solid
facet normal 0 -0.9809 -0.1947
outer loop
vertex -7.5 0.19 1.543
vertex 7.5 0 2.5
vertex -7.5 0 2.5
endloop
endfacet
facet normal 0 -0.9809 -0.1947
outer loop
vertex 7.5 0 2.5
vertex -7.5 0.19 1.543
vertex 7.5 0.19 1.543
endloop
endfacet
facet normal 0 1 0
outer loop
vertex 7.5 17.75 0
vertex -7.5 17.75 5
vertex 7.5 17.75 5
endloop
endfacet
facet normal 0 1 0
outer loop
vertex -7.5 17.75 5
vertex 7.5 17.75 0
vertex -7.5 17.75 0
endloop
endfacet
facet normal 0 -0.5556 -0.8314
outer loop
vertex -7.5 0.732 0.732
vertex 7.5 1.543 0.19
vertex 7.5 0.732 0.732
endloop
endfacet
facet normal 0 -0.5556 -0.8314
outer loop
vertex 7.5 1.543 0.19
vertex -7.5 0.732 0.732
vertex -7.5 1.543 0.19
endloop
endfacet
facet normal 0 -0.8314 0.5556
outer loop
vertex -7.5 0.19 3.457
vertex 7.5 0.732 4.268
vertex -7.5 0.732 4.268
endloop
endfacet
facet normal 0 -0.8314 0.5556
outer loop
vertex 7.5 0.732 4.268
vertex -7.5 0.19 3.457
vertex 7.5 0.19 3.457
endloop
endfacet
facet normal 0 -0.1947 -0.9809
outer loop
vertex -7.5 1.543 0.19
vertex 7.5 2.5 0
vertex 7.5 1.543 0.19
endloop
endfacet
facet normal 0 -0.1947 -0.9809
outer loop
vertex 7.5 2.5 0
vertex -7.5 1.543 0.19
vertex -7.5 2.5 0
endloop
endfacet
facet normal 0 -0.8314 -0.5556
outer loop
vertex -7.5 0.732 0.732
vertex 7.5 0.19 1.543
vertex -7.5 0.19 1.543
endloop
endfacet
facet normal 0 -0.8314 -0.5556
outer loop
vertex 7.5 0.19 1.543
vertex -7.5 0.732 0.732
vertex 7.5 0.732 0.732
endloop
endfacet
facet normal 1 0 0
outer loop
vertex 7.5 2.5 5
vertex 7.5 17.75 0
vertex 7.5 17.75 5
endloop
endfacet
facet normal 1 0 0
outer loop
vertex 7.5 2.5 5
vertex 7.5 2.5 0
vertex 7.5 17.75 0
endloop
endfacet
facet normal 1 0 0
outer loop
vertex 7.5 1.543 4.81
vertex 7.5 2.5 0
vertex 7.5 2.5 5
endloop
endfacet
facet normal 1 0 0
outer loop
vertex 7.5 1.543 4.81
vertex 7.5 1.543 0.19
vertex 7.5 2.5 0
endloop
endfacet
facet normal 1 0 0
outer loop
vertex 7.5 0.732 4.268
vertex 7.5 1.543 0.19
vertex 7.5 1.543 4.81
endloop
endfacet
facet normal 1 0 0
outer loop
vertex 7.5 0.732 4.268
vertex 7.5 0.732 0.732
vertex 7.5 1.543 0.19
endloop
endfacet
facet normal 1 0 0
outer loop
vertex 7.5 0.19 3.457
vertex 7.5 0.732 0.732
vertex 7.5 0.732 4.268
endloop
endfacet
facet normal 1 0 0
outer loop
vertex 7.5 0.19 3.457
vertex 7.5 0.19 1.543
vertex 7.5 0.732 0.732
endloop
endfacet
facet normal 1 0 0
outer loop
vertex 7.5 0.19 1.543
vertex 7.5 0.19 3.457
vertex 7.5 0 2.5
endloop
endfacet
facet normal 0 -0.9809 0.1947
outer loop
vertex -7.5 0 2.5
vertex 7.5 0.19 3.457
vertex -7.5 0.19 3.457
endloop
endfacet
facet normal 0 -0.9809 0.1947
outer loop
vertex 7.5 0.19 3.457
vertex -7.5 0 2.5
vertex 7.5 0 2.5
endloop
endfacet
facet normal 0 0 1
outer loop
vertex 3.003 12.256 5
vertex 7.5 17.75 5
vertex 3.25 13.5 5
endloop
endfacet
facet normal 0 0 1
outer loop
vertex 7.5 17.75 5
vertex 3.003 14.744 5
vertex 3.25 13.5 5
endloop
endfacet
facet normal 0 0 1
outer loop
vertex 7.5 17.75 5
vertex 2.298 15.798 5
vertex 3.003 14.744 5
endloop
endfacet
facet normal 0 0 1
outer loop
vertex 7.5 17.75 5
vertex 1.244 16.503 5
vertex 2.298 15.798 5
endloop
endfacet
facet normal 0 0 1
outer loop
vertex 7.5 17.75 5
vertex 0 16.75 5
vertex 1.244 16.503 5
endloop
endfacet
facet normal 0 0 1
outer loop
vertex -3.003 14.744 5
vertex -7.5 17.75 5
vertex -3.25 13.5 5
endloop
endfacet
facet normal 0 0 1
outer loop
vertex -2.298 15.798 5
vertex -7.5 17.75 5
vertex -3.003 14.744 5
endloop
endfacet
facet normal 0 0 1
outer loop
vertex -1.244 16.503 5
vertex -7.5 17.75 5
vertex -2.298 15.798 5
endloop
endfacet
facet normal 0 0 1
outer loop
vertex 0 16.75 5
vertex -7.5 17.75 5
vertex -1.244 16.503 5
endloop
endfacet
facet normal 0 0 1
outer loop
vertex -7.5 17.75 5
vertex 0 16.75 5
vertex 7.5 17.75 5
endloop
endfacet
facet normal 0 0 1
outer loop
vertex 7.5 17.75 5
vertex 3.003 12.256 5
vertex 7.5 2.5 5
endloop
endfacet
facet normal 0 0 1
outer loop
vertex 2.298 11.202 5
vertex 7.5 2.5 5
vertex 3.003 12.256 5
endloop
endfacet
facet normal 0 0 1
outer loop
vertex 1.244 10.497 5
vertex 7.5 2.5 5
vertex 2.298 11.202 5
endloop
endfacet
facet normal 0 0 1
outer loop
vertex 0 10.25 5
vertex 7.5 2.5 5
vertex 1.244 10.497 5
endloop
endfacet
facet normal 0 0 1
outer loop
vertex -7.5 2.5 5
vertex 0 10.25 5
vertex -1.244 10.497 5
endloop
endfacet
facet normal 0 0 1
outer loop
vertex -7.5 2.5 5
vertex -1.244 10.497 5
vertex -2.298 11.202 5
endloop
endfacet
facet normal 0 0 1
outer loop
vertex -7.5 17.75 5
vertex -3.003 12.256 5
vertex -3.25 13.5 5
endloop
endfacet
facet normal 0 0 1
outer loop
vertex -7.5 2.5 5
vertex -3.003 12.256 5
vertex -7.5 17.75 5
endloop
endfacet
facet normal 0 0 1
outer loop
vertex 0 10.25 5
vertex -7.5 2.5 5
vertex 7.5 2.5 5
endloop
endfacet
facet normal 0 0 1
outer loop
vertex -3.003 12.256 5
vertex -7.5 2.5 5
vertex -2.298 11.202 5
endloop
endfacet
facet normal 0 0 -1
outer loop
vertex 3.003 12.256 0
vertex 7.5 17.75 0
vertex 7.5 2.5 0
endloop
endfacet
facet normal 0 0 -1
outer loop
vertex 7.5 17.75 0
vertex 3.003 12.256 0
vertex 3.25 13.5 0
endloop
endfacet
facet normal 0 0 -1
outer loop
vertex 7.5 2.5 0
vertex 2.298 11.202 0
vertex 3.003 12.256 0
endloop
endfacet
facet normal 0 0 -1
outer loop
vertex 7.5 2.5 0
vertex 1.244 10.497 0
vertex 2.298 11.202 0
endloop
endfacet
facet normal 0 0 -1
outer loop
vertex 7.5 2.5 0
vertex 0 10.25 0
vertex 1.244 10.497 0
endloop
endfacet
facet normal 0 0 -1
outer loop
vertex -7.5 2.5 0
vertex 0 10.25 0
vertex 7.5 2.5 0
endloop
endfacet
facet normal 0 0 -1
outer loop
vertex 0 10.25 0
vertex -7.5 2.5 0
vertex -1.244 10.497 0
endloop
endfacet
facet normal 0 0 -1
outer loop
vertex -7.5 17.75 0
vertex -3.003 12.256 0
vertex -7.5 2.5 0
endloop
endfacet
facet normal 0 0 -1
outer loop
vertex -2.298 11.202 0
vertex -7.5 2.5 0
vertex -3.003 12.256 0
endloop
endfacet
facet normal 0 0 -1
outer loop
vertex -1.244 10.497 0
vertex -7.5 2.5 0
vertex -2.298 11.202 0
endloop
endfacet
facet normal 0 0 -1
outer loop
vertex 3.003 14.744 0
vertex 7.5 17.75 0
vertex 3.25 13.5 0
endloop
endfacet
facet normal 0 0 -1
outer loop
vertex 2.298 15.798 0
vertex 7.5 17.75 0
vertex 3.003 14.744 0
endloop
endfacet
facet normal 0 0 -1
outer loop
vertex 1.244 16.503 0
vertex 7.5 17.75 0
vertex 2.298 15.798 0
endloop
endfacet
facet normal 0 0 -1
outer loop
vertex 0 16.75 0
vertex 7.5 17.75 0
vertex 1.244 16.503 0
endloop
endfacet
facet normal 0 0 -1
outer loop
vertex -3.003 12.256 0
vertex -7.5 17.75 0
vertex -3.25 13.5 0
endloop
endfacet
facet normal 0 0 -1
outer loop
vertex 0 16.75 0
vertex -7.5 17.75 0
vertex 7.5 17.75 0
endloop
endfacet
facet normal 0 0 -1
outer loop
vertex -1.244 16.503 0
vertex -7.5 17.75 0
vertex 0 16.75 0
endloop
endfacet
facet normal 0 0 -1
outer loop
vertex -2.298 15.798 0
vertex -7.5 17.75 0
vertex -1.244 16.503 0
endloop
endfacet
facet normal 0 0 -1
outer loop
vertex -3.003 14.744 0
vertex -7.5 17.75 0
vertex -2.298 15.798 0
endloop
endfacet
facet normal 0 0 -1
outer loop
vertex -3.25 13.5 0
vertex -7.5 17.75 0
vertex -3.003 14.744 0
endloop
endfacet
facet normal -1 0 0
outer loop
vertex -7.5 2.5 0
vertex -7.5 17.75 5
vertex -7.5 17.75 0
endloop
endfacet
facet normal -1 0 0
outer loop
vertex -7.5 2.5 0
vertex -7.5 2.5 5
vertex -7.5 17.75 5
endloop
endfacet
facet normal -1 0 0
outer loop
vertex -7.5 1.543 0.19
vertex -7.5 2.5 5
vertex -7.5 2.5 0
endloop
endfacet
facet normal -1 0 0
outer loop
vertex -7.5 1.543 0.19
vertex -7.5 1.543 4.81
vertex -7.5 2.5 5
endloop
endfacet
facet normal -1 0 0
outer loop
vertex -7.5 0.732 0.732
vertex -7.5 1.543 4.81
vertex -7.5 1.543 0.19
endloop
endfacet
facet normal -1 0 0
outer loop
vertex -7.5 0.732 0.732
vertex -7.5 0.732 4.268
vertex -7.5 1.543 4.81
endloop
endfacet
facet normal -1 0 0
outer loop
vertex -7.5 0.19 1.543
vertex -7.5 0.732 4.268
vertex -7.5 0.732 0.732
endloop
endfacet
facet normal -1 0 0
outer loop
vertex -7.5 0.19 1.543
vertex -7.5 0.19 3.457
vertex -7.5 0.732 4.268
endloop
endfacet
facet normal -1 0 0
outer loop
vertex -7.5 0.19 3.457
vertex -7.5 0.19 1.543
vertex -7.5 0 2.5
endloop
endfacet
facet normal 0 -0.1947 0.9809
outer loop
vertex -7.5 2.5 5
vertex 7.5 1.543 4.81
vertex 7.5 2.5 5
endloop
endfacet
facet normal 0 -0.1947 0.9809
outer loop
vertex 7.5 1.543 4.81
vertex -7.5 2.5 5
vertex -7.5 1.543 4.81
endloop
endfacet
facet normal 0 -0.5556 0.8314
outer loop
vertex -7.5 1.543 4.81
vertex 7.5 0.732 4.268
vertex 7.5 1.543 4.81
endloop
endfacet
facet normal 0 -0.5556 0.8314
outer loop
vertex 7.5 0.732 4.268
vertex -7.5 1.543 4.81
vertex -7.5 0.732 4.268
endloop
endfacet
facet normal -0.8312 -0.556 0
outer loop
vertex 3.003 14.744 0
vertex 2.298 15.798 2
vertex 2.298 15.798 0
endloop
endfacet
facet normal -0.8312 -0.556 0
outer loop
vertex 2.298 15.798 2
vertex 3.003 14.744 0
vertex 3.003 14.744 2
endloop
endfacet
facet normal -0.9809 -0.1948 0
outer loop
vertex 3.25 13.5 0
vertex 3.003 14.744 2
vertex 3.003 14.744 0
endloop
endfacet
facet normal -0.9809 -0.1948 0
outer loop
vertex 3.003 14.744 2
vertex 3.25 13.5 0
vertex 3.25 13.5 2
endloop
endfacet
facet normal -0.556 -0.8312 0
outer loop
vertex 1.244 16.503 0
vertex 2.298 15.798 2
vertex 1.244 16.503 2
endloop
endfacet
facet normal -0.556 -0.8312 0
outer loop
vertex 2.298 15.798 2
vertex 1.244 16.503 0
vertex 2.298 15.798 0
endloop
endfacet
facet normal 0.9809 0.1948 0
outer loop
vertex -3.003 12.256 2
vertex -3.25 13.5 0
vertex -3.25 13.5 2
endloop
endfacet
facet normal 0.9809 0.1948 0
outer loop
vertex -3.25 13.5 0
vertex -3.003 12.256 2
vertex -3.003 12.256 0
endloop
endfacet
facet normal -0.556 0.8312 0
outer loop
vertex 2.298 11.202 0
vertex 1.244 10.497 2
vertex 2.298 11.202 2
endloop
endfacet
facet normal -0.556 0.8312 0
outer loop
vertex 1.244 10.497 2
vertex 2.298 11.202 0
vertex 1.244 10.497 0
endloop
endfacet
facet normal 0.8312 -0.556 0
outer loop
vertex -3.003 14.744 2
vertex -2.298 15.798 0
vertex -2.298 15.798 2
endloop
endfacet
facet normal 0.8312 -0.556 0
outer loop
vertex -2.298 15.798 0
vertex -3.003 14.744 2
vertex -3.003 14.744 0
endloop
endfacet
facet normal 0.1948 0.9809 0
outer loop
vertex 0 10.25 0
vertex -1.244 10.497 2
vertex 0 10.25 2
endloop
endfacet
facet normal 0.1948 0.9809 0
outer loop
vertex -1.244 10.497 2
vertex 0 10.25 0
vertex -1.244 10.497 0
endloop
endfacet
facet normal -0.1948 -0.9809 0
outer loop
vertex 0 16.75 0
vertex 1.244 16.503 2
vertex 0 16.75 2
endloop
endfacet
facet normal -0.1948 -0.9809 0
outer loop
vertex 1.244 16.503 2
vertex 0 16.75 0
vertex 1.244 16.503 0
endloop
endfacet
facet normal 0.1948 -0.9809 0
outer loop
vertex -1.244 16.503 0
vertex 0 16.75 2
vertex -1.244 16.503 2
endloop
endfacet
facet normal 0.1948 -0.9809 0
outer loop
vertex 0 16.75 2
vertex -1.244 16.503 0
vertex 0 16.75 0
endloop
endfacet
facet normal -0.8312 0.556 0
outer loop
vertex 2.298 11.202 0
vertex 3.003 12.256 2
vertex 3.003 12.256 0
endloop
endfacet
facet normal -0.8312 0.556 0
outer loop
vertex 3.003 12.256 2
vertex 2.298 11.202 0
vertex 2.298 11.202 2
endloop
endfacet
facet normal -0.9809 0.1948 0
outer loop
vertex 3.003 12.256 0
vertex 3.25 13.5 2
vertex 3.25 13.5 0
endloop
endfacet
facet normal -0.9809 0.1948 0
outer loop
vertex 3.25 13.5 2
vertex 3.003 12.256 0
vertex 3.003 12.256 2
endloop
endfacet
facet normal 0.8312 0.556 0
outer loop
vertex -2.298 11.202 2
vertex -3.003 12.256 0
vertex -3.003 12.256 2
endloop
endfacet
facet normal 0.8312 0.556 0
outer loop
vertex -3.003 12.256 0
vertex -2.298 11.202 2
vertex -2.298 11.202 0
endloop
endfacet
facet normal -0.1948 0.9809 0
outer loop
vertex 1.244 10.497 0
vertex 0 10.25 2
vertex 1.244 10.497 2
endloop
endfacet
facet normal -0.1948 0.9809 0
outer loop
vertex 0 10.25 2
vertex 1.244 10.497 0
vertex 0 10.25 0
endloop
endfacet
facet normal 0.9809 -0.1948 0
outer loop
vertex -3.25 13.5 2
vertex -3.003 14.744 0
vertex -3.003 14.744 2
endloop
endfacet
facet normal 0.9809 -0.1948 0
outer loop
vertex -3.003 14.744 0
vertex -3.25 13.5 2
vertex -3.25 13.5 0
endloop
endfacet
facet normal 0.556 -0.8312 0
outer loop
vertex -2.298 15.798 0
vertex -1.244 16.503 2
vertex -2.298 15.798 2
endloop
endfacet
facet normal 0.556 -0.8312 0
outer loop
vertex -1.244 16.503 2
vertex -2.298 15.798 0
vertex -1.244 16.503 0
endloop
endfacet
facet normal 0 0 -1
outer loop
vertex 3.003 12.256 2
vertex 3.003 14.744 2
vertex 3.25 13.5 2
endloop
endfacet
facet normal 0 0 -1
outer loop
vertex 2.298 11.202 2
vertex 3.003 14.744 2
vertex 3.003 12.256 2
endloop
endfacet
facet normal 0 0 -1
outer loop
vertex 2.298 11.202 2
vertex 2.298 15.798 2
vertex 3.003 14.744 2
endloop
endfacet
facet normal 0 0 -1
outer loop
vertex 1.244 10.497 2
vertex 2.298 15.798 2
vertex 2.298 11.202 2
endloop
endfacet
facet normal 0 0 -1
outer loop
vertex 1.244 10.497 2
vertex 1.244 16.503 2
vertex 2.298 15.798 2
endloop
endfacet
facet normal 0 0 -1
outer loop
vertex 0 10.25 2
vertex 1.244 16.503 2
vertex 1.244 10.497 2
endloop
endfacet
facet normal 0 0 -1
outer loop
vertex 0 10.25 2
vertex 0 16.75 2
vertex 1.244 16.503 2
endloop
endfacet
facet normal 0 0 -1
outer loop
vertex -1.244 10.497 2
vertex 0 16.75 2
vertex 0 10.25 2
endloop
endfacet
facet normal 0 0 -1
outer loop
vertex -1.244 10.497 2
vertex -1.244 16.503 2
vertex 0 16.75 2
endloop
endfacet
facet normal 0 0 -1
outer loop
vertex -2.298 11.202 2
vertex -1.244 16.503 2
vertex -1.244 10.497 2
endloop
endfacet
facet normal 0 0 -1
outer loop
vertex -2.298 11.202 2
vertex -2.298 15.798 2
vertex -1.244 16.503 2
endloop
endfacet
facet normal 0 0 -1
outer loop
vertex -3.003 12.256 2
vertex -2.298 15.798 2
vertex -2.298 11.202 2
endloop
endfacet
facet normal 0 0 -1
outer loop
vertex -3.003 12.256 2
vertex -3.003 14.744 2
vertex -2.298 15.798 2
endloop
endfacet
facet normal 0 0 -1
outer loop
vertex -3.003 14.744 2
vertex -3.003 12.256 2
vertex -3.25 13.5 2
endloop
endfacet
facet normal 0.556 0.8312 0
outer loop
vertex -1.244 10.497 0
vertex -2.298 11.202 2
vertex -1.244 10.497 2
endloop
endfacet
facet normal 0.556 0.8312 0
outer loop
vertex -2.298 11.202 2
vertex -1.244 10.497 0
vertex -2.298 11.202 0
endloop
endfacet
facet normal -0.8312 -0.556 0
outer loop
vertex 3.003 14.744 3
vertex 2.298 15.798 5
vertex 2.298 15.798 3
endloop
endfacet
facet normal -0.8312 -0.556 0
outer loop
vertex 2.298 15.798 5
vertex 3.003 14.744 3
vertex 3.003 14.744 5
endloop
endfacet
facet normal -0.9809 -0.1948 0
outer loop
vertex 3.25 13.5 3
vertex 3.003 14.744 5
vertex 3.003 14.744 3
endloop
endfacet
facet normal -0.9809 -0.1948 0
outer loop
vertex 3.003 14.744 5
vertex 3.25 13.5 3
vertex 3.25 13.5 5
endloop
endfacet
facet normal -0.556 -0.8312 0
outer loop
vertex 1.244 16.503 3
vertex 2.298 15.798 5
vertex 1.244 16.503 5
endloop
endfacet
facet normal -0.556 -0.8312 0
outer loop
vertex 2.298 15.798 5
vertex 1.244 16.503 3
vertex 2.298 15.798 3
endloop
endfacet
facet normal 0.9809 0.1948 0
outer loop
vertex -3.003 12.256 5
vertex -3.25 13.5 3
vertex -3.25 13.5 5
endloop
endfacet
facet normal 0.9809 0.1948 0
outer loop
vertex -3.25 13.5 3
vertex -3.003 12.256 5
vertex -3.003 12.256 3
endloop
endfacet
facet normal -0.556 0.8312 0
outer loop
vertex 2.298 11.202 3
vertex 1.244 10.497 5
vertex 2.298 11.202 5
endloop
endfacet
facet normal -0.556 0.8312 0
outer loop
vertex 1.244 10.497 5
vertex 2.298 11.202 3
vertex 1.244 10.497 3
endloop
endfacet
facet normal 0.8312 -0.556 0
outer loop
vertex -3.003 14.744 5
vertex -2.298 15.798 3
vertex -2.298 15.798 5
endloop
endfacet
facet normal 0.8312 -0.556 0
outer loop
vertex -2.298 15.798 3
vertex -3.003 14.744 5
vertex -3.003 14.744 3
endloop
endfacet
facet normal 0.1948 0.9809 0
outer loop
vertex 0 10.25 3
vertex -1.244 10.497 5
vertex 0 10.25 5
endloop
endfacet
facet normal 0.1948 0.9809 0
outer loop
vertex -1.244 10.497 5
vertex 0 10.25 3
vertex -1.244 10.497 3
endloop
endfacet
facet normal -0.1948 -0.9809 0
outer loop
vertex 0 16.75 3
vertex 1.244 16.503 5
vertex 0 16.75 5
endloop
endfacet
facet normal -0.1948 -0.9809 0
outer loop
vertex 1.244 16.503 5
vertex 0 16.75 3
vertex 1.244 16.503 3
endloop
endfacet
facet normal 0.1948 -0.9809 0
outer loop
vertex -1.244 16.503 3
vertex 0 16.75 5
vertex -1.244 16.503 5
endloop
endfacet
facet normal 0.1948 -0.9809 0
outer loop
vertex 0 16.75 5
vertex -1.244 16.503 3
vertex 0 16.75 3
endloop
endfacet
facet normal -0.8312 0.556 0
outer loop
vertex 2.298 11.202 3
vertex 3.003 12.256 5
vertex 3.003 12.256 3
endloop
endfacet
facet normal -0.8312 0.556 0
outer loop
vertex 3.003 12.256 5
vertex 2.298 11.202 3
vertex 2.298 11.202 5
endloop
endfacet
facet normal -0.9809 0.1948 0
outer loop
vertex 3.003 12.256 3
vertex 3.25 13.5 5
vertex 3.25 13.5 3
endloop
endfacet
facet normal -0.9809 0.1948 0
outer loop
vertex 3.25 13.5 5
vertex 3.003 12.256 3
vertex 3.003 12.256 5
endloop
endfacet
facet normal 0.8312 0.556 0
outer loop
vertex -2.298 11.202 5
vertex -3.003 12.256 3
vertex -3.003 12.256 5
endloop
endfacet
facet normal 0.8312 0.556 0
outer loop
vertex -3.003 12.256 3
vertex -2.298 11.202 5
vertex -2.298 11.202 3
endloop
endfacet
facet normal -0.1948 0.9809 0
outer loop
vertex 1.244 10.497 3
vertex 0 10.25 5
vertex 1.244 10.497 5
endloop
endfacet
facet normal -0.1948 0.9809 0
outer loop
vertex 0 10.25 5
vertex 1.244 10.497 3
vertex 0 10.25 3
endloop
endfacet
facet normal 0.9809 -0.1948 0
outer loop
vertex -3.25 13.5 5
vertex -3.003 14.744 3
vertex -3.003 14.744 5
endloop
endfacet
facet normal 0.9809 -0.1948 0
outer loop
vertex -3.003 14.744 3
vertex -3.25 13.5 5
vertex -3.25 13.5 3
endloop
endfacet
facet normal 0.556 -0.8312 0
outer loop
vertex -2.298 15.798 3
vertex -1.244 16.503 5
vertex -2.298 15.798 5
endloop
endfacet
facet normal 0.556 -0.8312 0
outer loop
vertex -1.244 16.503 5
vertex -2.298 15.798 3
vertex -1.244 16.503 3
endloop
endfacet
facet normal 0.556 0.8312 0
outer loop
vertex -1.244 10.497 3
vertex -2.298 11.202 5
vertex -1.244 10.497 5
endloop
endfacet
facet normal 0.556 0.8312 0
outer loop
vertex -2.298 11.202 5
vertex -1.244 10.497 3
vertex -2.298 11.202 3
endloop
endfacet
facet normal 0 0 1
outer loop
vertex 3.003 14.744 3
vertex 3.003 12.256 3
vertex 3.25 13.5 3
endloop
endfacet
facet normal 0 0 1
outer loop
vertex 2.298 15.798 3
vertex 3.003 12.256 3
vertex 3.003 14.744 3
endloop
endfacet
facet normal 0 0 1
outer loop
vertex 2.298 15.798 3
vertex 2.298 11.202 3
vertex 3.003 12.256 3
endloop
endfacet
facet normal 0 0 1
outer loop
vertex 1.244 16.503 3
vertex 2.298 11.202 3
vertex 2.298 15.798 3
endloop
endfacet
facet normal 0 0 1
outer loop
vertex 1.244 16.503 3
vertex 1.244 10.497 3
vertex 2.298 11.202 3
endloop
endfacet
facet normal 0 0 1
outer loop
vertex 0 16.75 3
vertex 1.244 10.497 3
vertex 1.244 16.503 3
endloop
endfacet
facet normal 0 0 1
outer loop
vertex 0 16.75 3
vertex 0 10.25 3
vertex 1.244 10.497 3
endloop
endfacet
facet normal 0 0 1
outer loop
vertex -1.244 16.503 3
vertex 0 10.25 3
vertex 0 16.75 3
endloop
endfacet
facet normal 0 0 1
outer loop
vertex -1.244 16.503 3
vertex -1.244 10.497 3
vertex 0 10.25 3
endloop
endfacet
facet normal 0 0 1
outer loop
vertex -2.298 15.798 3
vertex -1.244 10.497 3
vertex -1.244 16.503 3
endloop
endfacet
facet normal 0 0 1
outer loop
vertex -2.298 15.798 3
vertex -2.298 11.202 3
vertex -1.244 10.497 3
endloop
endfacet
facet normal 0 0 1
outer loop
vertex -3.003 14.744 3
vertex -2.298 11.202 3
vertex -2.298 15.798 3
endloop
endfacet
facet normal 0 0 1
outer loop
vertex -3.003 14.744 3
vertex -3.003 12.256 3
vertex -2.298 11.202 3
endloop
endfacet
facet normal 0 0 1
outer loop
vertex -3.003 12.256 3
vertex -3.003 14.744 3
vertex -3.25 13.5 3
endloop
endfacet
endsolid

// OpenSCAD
w = 15;
h = 5;
hr = 3.25;
hd = 13.5;
d = hd+hr+1;

difference(){
	translate([-w/2,0])rotate([90,0,90])
		linear_extrude(w) {
			translate([h/2,h/2]) circle(h/2,$fn=16);
			translate([h/2,0]) square([d-h/2,h]);
		}
	translate([0,hd,(h-1)/2-h])cylinder(h,hr,hr,$fn=16);
	translate([0,hd,(h-1)/2+1])cylinder(h,hr,hr,$fn=16);
}
